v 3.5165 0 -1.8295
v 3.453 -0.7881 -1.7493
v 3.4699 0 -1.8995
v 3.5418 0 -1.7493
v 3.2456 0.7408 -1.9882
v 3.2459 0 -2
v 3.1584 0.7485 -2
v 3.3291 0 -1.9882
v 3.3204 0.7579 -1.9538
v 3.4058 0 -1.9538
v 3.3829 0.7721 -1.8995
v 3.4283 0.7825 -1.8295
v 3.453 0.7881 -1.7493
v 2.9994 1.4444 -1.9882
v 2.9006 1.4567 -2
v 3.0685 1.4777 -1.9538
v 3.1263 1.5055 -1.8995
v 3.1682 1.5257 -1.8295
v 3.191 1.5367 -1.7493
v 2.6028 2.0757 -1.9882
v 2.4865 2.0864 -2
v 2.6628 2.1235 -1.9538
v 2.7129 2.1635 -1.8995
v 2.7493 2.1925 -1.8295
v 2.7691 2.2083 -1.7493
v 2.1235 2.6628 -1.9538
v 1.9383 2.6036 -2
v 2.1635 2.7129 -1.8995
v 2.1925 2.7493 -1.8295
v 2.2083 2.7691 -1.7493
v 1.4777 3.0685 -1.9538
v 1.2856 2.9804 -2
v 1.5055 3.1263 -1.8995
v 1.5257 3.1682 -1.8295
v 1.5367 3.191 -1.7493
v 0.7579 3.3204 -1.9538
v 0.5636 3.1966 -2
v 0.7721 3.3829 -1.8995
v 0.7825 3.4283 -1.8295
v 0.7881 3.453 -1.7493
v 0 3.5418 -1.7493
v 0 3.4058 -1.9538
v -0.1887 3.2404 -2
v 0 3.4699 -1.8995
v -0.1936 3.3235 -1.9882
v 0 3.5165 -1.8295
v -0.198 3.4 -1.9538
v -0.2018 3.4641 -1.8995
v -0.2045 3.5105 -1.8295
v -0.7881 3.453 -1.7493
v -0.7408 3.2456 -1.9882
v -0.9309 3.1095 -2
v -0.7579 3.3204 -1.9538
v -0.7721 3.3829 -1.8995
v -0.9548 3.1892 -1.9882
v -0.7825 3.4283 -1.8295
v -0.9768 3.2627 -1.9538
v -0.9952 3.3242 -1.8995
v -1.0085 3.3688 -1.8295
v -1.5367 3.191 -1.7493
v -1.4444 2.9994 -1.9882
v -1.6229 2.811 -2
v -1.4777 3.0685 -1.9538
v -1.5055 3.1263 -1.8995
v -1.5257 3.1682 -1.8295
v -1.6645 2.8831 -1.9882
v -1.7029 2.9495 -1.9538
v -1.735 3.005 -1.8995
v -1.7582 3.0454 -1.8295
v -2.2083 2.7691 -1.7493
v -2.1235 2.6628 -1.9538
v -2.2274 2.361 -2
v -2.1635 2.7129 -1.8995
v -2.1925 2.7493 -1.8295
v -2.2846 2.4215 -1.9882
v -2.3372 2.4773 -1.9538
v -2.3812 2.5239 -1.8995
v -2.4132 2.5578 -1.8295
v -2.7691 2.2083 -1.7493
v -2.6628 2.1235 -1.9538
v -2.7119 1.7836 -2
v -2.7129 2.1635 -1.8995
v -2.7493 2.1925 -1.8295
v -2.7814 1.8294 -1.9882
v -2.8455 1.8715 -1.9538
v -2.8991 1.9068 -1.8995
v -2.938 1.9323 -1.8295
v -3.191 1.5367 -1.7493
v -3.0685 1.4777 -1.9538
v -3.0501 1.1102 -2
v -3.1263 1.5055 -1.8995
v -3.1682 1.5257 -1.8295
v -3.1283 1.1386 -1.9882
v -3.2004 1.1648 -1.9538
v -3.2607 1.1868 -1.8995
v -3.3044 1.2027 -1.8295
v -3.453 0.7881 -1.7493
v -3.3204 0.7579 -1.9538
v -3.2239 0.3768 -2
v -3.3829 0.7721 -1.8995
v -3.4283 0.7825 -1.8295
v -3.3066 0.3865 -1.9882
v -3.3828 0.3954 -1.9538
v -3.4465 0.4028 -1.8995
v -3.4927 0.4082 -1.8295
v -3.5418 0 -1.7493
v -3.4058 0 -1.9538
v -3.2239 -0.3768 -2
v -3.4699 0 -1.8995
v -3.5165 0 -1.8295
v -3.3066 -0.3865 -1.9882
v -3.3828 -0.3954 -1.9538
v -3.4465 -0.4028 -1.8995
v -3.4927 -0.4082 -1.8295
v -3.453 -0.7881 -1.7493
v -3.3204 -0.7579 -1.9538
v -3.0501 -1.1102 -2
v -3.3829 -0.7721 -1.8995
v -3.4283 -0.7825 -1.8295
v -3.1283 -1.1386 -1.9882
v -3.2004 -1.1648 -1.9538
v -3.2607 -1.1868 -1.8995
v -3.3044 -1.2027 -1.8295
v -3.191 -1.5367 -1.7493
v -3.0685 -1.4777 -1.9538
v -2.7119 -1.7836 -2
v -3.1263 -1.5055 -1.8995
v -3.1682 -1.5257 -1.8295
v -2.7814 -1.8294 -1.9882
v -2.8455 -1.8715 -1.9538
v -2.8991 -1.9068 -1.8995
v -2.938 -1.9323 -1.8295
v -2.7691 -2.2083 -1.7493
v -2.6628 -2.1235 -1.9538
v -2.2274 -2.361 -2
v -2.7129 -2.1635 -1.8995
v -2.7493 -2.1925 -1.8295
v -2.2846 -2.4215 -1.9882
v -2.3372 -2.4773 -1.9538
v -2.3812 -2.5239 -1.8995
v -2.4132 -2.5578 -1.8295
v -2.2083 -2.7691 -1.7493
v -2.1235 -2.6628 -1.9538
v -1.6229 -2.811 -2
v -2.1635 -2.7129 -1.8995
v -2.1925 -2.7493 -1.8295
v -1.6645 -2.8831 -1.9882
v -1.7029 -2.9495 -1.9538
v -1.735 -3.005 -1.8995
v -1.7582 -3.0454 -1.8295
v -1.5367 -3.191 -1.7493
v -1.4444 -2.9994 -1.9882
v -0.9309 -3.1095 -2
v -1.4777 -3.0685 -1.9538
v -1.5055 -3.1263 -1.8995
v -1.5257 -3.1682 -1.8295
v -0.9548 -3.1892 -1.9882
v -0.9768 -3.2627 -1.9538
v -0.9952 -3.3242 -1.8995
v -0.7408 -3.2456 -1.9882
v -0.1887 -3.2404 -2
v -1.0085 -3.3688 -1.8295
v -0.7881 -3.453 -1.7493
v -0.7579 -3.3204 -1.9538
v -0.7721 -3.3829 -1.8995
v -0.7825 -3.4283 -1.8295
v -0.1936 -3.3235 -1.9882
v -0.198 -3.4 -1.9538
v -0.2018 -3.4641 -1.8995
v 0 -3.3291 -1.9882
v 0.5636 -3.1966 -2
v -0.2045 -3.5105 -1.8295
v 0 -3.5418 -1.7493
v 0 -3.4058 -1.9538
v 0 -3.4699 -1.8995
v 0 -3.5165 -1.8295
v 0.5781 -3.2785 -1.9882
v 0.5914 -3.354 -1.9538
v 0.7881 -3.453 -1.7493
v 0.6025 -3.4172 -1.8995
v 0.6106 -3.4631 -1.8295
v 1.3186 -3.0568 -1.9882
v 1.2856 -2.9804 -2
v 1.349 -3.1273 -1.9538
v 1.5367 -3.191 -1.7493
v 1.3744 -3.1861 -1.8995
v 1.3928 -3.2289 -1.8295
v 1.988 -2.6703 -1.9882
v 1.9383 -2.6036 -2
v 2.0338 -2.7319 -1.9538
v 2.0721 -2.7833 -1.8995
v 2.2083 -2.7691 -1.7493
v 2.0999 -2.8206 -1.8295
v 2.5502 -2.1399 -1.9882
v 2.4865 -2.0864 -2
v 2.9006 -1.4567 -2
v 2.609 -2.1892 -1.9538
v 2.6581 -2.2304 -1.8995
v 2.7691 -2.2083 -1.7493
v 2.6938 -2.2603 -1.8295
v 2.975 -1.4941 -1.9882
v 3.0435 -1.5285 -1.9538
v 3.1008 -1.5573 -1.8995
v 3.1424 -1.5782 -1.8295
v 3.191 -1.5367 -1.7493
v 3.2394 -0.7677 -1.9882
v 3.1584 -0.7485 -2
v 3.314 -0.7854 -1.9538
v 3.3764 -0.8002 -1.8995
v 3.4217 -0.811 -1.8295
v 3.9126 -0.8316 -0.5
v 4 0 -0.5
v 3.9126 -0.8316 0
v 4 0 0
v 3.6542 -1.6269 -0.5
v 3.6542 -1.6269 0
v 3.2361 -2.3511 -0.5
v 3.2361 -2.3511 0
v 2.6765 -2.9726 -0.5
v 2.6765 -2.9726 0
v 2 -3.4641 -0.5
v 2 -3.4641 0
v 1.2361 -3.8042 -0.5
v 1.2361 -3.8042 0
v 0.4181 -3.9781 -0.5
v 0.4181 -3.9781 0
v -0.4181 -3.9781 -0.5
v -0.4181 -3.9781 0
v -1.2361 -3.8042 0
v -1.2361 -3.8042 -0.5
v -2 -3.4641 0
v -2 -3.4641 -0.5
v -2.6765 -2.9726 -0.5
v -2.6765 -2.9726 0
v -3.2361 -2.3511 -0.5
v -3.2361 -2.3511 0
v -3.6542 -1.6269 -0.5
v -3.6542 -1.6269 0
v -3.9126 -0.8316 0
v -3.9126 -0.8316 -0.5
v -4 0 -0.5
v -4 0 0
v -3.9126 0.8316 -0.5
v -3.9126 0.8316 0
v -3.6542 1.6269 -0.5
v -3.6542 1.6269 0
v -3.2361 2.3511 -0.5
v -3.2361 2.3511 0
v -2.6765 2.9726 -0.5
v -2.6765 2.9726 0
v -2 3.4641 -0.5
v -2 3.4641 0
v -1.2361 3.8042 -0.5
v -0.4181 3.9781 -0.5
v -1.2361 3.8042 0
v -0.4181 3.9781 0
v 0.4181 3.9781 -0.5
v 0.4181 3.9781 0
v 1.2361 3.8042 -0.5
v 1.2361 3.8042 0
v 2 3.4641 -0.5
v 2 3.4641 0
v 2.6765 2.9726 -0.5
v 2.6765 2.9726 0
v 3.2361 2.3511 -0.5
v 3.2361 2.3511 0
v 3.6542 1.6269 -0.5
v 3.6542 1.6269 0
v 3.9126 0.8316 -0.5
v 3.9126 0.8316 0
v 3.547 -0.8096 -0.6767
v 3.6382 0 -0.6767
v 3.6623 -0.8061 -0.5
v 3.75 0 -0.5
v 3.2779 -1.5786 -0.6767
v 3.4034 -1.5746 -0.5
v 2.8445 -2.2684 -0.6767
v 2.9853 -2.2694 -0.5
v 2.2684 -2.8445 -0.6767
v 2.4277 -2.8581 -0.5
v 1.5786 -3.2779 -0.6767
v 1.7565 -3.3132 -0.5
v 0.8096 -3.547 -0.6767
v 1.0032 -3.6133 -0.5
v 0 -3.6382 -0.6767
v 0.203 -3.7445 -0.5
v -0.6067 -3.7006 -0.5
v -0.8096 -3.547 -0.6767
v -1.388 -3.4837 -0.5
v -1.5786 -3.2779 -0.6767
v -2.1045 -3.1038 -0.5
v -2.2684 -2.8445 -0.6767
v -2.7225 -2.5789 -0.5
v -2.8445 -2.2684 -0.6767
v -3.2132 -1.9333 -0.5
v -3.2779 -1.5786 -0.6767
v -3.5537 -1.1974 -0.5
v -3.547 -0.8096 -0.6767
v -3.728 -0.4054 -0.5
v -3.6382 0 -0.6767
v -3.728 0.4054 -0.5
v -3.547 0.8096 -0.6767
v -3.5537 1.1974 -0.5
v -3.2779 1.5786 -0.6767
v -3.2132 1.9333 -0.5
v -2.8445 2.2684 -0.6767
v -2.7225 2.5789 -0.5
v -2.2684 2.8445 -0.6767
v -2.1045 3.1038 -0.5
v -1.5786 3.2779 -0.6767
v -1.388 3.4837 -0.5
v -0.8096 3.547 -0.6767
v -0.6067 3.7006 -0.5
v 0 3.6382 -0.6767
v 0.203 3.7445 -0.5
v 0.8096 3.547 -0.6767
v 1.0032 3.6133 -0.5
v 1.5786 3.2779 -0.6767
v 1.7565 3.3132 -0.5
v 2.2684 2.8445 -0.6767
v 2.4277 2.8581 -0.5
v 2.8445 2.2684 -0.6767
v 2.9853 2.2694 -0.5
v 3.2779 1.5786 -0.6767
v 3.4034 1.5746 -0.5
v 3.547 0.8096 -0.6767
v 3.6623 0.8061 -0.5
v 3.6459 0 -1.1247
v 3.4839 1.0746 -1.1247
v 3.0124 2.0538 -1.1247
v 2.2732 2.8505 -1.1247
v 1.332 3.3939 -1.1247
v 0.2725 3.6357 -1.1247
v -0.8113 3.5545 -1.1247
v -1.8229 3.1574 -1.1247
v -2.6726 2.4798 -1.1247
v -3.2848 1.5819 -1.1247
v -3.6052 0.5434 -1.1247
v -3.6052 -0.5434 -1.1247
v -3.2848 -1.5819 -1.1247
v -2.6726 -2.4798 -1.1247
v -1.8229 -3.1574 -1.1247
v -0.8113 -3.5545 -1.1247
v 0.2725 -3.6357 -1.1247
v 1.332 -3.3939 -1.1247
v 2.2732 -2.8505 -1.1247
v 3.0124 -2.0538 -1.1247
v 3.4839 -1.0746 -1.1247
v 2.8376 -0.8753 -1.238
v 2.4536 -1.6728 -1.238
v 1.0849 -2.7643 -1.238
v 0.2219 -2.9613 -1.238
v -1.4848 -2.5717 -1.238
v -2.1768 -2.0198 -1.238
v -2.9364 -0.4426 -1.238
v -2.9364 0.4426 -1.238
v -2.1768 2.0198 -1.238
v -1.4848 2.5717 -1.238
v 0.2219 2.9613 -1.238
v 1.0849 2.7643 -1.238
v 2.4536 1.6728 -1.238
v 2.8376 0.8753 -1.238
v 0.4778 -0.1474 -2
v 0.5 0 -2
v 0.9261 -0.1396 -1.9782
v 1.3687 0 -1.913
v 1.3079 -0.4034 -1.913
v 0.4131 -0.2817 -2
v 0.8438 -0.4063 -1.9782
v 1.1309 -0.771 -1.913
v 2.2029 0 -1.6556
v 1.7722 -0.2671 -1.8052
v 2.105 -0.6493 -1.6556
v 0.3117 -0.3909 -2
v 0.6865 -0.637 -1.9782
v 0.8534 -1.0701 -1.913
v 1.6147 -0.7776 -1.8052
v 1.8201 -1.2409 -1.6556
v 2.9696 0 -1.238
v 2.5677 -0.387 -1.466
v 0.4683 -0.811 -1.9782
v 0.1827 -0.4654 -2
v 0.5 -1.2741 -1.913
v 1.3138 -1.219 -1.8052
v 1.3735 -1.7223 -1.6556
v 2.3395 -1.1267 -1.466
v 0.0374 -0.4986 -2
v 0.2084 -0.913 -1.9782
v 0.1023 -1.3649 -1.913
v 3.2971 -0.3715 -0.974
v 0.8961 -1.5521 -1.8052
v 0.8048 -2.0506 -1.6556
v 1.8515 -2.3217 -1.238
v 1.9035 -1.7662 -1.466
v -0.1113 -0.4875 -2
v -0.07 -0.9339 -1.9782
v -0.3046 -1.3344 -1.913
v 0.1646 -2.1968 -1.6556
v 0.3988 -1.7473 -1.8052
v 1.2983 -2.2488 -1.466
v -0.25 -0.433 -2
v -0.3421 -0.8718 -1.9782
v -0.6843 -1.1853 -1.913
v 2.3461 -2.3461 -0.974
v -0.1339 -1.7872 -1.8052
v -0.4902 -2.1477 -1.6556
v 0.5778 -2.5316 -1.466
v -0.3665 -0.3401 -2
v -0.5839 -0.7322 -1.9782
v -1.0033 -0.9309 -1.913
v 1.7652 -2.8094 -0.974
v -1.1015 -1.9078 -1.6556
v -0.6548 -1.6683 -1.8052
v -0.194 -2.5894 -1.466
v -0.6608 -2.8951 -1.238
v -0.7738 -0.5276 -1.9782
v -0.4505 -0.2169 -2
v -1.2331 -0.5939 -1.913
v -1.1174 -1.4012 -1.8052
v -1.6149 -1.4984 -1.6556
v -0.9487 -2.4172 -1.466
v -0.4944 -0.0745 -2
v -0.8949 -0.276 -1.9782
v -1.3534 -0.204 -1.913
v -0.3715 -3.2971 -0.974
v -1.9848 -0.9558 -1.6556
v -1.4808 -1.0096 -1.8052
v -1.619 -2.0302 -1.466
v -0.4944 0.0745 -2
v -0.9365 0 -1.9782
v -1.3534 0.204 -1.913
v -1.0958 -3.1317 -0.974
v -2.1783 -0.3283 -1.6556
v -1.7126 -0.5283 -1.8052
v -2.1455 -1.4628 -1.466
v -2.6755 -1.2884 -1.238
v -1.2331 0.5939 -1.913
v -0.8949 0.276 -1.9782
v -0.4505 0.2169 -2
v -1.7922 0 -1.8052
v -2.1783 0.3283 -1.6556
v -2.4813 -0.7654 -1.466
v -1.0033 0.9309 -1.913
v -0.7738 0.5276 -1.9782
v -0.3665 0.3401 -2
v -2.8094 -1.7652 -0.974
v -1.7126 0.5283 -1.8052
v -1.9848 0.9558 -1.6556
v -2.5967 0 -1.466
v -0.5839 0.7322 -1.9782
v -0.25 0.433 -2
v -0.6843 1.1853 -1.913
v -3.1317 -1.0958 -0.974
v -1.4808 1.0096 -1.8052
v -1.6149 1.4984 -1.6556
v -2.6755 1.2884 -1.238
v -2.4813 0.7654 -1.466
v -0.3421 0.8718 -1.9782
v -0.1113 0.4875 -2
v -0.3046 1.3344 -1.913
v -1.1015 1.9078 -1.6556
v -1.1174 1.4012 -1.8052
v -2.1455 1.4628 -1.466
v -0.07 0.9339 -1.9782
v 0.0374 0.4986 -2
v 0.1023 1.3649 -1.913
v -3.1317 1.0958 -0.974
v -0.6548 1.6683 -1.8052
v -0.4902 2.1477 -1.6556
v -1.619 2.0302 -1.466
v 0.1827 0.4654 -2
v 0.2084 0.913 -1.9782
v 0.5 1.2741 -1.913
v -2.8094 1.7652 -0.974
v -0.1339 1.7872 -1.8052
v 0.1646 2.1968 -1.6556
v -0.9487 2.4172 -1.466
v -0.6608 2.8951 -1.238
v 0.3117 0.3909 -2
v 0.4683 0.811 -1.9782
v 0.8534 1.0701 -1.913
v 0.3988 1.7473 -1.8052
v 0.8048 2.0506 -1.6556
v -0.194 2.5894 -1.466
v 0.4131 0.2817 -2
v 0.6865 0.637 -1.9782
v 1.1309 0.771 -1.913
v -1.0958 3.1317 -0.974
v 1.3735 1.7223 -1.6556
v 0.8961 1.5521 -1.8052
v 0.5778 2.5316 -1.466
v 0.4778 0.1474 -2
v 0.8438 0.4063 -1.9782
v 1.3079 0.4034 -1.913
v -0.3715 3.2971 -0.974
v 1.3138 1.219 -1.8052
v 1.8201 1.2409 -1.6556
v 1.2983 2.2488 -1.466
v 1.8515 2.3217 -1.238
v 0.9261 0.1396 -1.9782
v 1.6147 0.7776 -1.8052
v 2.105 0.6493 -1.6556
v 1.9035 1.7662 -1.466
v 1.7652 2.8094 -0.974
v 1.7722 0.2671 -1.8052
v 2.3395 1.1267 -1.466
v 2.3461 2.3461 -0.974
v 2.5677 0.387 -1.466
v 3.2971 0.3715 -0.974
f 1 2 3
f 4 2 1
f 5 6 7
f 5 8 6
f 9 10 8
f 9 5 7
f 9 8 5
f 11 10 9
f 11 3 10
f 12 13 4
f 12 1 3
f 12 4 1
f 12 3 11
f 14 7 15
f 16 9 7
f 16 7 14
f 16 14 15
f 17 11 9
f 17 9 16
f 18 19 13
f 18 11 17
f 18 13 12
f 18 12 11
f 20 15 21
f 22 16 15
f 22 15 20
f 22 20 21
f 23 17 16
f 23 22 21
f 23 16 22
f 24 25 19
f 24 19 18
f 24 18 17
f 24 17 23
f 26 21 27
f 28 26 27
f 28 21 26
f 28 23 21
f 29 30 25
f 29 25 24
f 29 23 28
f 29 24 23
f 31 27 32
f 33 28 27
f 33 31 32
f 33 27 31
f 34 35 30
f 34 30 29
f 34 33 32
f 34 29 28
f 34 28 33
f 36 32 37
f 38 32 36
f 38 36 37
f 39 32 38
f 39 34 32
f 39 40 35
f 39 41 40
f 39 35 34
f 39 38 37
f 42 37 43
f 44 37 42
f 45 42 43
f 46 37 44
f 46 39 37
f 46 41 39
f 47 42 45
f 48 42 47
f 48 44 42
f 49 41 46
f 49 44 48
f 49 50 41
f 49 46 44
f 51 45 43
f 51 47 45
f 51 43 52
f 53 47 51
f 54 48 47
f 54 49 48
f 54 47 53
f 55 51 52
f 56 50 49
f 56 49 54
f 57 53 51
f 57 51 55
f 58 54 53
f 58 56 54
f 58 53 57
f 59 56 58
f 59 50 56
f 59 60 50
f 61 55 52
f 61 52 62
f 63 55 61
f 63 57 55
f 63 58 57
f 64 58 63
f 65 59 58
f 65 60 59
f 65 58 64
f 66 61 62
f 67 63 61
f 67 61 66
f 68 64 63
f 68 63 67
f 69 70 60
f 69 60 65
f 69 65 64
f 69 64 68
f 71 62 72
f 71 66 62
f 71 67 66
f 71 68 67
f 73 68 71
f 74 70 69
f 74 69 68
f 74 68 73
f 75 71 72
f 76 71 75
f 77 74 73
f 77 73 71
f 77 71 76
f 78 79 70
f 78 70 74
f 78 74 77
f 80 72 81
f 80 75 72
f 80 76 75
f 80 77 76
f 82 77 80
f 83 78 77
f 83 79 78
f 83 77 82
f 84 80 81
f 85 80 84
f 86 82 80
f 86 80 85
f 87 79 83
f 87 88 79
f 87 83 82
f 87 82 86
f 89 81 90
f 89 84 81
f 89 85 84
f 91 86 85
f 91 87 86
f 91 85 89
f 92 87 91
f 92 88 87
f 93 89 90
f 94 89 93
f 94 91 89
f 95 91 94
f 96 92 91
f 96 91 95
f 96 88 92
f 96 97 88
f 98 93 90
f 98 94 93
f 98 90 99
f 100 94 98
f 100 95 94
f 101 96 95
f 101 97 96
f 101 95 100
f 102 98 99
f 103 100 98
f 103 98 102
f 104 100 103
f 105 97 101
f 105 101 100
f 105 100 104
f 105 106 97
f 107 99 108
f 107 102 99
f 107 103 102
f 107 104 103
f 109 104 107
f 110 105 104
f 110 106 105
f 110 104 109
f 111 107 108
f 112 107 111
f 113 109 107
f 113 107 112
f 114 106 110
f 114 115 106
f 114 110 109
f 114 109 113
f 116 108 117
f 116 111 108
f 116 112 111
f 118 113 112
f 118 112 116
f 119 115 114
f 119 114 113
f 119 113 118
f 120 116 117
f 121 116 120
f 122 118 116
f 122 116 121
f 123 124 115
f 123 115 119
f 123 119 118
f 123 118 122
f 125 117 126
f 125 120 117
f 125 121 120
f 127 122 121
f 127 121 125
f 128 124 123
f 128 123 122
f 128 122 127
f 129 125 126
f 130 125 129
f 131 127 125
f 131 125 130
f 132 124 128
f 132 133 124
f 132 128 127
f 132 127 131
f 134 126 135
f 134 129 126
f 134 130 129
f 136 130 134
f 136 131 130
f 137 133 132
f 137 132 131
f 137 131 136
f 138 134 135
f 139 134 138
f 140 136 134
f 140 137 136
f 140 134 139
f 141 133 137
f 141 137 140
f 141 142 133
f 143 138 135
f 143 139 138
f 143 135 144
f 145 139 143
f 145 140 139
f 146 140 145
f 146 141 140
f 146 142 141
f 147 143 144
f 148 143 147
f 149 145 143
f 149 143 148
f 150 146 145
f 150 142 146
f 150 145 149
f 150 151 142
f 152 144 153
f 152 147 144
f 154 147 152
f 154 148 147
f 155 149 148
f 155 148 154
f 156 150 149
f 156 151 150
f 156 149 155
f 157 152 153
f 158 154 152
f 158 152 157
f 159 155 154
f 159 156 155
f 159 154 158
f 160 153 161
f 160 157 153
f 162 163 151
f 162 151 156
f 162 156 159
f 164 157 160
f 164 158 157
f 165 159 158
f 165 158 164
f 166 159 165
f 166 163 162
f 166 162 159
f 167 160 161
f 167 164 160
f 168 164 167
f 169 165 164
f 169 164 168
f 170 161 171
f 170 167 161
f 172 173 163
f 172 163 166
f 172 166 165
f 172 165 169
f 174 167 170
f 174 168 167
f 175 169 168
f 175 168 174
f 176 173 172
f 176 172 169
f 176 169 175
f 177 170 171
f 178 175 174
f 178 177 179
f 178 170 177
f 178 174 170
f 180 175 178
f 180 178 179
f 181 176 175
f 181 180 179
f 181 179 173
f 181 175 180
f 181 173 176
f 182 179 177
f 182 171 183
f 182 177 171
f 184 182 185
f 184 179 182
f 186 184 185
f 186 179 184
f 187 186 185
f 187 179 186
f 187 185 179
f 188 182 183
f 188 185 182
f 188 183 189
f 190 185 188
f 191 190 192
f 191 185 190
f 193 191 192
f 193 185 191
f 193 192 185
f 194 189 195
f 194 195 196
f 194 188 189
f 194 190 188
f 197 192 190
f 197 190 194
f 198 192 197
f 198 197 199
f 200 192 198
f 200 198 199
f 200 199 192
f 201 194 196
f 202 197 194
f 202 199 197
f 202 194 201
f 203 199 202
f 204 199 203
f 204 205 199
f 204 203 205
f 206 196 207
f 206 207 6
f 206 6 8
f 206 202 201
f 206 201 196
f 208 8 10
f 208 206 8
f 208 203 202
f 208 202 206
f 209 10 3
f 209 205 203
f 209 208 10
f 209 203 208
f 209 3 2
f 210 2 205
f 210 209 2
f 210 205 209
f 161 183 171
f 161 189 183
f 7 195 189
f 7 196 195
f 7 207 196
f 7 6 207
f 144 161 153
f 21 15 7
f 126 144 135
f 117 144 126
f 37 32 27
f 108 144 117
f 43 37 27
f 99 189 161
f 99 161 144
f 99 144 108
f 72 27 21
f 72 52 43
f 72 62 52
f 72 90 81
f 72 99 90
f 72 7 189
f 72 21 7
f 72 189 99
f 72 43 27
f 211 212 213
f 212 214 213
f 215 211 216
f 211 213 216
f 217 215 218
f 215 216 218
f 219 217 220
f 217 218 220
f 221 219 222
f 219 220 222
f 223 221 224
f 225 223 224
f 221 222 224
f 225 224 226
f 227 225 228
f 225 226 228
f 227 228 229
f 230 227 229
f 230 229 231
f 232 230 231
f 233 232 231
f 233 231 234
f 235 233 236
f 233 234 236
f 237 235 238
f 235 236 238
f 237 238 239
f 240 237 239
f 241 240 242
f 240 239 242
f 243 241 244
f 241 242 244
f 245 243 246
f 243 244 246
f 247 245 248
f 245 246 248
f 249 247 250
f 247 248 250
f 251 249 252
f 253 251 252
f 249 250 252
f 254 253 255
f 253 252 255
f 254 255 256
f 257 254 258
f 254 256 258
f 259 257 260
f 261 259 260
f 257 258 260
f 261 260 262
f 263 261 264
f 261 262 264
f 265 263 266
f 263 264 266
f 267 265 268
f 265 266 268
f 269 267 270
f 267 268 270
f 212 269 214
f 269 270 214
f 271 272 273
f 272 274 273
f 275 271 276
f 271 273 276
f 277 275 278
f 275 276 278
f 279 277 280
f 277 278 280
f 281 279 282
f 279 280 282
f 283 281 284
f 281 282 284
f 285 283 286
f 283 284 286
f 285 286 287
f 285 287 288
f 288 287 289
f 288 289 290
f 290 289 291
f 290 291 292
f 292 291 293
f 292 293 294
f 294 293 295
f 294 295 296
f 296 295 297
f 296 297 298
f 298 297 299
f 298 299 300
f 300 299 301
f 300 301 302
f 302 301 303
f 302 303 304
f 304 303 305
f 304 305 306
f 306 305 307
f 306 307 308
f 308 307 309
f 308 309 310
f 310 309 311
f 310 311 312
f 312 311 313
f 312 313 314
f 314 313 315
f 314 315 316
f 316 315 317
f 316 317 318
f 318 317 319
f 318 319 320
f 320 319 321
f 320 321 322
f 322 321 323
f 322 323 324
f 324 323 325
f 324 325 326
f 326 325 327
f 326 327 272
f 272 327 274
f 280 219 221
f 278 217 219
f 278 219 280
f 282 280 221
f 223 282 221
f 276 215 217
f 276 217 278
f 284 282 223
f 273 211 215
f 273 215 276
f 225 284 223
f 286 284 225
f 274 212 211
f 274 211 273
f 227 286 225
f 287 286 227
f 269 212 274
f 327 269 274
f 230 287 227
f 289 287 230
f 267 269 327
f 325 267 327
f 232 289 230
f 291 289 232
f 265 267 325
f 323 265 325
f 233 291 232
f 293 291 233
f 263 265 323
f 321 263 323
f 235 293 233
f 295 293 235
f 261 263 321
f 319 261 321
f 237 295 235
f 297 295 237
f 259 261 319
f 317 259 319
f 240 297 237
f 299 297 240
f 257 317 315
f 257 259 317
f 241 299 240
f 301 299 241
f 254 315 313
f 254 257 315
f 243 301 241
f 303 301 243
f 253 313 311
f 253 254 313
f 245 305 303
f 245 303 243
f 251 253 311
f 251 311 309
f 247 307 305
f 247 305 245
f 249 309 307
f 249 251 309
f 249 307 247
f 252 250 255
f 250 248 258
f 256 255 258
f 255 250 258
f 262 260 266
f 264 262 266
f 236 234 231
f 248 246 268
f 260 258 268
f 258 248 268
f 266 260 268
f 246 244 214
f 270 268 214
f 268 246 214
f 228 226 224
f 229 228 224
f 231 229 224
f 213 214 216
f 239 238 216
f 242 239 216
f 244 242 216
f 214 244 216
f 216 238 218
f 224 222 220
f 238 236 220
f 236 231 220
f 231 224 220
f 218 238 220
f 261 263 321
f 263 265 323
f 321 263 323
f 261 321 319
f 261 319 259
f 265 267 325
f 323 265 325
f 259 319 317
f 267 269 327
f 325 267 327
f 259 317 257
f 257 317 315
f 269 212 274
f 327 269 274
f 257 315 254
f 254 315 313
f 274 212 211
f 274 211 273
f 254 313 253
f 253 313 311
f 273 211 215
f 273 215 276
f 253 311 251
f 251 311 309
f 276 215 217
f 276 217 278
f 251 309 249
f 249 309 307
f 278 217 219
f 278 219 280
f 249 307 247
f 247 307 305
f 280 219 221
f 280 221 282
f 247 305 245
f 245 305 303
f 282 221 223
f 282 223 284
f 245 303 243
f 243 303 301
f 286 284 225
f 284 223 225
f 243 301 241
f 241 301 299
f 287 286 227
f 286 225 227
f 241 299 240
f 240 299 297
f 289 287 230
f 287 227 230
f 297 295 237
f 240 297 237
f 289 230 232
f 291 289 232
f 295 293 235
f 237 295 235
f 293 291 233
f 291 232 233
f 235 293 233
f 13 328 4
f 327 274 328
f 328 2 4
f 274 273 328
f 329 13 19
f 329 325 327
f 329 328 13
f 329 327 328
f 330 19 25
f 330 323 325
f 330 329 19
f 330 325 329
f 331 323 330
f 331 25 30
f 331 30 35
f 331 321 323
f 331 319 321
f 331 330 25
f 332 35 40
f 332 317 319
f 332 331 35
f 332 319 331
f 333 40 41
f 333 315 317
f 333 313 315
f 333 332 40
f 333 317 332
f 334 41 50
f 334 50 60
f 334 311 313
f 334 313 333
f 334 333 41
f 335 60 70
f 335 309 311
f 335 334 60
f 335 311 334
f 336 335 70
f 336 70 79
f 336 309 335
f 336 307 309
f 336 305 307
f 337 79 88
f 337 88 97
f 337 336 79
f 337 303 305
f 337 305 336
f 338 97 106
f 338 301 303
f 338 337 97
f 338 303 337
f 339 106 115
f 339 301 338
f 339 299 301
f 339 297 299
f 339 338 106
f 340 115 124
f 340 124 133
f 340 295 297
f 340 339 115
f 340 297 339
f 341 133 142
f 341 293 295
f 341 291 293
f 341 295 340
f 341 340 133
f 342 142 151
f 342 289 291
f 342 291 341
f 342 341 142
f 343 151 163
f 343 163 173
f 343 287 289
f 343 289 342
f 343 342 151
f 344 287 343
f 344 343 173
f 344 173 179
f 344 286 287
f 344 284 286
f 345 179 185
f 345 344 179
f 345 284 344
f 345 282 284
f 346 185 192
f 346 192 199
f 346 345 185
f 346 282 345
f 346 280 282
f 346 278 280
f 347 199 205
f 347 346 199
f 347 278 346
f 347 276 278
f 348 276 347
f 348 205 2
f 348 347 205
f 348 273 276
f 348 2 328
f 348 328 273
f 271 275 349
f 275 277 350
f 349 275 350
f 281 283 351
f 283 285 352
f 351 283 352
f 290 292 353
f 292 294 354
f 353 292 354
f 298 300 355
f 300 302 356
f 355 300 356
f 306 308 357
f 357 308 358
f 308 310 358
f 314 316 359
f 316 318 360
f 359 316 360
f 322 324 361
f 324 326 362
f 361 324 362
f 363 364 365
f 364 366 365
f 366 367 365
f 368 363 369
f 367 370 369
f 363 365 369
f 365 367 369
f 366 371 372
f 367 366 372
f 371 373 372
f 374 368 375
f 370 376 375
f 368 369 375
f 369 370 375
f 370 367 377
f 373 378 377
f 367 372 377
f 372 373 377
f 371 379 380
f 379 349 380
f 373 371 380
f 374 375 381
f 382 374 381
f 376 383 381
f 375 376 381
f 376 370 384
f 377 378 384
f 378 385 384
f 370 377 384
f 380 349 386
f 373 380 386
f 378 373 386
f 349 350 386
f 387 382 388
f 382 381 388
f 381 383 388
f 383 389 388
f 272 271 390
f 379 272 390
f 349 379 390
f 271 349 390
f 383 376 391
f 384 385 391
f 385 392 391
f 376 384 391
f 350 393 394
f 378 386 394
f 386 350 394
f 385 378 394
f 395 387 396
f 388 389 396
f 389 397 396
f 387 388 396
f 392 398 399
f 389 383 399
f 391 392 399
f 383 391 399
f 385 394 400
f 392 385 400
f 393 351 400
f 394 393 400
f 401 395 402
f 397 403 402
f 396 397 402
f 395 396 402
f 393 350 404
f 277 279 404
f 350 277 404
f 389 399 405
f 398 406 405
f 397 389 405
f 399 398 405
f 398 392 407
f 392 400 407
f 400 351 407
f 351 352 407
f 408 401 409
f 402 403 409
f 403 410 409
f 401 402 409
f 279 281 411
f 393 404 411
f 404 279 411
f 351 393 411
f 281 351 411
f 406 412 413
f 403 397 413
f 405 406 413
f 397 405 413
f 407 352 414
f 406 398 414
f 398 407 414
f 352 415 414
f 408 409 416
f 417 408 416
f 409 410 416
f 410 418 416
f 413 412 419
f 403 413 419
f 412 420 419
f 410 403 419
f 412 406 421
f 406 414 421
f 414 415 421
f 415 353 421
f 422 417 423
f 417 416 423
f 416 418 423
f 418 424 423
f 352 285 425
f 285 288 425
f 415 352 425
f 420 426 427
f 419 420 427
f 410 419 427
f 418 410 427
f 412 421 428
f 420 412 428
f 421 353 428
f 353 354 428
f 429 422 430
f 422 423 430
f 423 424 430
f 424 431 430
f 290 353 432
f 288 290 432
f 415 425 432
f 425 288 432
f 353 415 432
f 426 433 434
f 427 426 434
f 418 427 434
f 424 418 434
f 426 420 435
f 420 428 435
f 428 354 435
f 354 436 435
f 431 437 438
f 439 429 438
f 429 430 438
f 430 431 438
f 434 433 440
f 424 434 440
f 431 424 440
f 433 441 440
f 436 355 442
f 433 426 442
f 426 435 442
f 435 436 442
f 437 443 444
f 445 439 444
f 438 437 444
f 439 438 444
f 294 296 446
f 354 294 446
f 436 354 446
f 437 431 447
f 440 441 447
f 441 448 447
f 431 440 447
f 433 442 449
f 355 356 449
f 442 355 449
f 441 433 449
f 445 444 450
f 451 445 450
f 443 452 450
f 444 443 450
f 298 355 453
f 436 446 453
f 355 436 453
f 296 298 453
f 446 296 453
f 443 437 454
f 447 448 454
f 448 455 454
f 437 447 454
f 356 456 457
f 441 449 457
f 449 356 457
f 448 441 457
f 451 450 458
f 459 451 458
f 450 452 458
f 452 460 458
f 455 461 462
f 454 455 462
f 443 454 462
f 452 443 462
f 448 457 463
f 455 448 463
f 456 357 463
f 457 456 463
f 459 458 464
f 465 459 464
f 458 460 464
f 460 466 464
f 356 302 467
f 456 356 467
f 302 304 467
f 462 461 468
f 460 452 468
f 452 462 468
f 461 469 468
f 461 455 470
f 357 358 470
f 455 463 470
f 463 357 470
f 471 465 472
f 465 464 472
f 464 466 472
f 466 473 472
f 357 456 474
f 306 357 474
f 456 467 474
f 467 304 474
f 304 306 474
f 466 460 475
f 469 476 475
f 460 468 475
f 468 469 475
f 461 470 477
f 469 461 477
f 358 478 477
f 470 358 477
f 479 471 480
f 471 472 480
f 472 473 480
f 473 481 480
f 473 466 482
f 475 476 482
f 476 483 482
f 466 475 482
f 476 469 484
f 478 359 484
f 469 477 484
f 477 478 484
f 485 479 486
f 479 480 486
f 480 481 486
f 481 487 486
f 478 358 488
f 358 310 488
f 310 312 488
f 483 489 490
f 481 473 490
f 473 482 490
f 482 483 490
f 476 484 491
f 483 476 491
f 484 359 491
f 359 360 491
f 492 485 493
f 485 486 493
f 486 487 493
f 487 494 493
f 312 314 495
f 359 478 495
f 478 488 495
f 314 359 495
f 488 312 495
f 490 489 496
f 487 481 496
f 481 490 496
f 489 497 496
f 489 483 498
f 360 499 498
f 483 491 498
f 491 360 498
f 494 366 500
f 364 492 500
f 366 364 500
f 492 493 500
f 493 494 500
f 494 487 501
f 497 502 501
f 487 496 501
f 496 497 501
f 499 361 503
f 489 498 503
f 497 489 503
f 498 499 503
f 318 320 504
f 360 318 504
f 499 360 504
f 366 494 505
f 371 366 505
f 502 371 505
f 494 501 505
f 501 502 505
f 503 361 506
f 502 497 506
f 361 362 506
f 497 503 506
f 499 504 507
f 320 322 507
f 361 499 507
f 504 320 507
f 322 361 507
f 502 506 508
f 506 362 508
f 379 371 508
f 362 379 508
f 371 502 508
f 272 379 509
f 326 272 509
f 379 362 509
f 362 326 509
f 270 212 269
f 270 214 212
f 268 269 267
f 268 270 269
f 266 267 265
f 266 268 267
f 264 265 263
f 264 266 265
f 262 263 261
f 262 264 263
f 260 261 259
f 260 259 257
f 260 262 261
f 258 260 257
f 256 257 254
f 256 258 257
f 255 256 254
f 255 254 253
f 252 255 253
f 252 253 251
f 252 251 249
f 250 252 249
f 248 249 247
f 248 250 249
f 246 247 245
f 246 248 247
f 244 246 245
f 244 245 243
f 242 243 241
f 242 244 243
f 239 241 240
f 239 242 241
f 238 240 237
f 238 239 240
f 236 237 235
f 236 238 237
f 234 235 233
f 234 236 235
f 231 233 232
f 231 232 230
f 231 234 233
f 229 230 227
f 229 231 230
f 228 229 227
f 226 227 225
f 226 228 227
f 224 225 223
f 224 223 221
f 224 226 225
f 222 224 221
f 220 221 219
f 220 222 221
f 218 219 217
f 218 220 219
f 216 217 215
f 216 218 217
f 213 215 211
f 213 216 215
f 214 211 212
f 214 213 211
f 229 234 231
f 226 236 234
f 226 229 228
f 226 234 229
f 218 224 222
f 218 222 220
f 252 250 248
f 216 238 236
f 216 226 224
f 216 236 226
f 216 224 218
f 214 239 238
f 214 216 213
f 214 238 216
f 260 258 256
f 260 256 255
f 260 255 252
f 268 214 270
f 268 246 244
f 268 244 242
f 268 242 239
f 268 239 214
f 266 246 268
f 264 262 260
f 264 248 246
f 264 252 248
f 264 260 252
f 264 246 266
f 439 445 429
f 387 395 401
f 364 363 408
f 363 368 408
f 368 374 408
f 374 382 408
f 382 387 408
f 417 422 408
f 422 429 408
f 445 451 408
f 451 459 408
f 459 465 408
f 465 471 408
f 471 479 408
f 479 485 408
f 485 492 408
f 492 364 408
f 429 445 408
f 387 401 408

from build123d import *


with BuildPart() as f1:
    # F0 (on Front) → F1 (revolve)
    with BuildSketch(Plane.XZ):
        with BuildLine():
            Line((4, 0), (0, 0))
            Line((0, 0), (0, -2))
            Line((0, -2), (3.245862, -2))
            ThreePointArc((3.245862, -2), (3.439774, -1.928906), (3.54178, -1.74932))
            Line((3.54178, -1.74932), (3.75, -0.5))
            Line((3.75, -0.5), (4, -0.5))
            Line((4, -0.5), (4, 0))
        make_face()
    revolve(axis=Axis((0, 0, -1), (0, 0, 1)))


with BuildPart() as f3:
    # F2 (on Front) → F3 (revolve)
    with BuildSketch(Plane.XZ):
        with BuildLine():
            Line((4, 0), (0, 0))
            Line((0, 0), (0, -2))
            Line((0, -2), (0.5, -2))
            ThreePointArc((0.5, -2), (2.202916, -1.655641), (3.638233, -0.676677))
            Line((3.638233, -0.676677), (3.75, -0.5))
            Line((3.75, -0.5), (4, -0.5))
            Line((4, -0.5), (4, 0))
        make_face()
    revolve(axis=Axis((0, 0, -1), (0, 0, -1)))


solid = Compound([f1.part, f3.part])
